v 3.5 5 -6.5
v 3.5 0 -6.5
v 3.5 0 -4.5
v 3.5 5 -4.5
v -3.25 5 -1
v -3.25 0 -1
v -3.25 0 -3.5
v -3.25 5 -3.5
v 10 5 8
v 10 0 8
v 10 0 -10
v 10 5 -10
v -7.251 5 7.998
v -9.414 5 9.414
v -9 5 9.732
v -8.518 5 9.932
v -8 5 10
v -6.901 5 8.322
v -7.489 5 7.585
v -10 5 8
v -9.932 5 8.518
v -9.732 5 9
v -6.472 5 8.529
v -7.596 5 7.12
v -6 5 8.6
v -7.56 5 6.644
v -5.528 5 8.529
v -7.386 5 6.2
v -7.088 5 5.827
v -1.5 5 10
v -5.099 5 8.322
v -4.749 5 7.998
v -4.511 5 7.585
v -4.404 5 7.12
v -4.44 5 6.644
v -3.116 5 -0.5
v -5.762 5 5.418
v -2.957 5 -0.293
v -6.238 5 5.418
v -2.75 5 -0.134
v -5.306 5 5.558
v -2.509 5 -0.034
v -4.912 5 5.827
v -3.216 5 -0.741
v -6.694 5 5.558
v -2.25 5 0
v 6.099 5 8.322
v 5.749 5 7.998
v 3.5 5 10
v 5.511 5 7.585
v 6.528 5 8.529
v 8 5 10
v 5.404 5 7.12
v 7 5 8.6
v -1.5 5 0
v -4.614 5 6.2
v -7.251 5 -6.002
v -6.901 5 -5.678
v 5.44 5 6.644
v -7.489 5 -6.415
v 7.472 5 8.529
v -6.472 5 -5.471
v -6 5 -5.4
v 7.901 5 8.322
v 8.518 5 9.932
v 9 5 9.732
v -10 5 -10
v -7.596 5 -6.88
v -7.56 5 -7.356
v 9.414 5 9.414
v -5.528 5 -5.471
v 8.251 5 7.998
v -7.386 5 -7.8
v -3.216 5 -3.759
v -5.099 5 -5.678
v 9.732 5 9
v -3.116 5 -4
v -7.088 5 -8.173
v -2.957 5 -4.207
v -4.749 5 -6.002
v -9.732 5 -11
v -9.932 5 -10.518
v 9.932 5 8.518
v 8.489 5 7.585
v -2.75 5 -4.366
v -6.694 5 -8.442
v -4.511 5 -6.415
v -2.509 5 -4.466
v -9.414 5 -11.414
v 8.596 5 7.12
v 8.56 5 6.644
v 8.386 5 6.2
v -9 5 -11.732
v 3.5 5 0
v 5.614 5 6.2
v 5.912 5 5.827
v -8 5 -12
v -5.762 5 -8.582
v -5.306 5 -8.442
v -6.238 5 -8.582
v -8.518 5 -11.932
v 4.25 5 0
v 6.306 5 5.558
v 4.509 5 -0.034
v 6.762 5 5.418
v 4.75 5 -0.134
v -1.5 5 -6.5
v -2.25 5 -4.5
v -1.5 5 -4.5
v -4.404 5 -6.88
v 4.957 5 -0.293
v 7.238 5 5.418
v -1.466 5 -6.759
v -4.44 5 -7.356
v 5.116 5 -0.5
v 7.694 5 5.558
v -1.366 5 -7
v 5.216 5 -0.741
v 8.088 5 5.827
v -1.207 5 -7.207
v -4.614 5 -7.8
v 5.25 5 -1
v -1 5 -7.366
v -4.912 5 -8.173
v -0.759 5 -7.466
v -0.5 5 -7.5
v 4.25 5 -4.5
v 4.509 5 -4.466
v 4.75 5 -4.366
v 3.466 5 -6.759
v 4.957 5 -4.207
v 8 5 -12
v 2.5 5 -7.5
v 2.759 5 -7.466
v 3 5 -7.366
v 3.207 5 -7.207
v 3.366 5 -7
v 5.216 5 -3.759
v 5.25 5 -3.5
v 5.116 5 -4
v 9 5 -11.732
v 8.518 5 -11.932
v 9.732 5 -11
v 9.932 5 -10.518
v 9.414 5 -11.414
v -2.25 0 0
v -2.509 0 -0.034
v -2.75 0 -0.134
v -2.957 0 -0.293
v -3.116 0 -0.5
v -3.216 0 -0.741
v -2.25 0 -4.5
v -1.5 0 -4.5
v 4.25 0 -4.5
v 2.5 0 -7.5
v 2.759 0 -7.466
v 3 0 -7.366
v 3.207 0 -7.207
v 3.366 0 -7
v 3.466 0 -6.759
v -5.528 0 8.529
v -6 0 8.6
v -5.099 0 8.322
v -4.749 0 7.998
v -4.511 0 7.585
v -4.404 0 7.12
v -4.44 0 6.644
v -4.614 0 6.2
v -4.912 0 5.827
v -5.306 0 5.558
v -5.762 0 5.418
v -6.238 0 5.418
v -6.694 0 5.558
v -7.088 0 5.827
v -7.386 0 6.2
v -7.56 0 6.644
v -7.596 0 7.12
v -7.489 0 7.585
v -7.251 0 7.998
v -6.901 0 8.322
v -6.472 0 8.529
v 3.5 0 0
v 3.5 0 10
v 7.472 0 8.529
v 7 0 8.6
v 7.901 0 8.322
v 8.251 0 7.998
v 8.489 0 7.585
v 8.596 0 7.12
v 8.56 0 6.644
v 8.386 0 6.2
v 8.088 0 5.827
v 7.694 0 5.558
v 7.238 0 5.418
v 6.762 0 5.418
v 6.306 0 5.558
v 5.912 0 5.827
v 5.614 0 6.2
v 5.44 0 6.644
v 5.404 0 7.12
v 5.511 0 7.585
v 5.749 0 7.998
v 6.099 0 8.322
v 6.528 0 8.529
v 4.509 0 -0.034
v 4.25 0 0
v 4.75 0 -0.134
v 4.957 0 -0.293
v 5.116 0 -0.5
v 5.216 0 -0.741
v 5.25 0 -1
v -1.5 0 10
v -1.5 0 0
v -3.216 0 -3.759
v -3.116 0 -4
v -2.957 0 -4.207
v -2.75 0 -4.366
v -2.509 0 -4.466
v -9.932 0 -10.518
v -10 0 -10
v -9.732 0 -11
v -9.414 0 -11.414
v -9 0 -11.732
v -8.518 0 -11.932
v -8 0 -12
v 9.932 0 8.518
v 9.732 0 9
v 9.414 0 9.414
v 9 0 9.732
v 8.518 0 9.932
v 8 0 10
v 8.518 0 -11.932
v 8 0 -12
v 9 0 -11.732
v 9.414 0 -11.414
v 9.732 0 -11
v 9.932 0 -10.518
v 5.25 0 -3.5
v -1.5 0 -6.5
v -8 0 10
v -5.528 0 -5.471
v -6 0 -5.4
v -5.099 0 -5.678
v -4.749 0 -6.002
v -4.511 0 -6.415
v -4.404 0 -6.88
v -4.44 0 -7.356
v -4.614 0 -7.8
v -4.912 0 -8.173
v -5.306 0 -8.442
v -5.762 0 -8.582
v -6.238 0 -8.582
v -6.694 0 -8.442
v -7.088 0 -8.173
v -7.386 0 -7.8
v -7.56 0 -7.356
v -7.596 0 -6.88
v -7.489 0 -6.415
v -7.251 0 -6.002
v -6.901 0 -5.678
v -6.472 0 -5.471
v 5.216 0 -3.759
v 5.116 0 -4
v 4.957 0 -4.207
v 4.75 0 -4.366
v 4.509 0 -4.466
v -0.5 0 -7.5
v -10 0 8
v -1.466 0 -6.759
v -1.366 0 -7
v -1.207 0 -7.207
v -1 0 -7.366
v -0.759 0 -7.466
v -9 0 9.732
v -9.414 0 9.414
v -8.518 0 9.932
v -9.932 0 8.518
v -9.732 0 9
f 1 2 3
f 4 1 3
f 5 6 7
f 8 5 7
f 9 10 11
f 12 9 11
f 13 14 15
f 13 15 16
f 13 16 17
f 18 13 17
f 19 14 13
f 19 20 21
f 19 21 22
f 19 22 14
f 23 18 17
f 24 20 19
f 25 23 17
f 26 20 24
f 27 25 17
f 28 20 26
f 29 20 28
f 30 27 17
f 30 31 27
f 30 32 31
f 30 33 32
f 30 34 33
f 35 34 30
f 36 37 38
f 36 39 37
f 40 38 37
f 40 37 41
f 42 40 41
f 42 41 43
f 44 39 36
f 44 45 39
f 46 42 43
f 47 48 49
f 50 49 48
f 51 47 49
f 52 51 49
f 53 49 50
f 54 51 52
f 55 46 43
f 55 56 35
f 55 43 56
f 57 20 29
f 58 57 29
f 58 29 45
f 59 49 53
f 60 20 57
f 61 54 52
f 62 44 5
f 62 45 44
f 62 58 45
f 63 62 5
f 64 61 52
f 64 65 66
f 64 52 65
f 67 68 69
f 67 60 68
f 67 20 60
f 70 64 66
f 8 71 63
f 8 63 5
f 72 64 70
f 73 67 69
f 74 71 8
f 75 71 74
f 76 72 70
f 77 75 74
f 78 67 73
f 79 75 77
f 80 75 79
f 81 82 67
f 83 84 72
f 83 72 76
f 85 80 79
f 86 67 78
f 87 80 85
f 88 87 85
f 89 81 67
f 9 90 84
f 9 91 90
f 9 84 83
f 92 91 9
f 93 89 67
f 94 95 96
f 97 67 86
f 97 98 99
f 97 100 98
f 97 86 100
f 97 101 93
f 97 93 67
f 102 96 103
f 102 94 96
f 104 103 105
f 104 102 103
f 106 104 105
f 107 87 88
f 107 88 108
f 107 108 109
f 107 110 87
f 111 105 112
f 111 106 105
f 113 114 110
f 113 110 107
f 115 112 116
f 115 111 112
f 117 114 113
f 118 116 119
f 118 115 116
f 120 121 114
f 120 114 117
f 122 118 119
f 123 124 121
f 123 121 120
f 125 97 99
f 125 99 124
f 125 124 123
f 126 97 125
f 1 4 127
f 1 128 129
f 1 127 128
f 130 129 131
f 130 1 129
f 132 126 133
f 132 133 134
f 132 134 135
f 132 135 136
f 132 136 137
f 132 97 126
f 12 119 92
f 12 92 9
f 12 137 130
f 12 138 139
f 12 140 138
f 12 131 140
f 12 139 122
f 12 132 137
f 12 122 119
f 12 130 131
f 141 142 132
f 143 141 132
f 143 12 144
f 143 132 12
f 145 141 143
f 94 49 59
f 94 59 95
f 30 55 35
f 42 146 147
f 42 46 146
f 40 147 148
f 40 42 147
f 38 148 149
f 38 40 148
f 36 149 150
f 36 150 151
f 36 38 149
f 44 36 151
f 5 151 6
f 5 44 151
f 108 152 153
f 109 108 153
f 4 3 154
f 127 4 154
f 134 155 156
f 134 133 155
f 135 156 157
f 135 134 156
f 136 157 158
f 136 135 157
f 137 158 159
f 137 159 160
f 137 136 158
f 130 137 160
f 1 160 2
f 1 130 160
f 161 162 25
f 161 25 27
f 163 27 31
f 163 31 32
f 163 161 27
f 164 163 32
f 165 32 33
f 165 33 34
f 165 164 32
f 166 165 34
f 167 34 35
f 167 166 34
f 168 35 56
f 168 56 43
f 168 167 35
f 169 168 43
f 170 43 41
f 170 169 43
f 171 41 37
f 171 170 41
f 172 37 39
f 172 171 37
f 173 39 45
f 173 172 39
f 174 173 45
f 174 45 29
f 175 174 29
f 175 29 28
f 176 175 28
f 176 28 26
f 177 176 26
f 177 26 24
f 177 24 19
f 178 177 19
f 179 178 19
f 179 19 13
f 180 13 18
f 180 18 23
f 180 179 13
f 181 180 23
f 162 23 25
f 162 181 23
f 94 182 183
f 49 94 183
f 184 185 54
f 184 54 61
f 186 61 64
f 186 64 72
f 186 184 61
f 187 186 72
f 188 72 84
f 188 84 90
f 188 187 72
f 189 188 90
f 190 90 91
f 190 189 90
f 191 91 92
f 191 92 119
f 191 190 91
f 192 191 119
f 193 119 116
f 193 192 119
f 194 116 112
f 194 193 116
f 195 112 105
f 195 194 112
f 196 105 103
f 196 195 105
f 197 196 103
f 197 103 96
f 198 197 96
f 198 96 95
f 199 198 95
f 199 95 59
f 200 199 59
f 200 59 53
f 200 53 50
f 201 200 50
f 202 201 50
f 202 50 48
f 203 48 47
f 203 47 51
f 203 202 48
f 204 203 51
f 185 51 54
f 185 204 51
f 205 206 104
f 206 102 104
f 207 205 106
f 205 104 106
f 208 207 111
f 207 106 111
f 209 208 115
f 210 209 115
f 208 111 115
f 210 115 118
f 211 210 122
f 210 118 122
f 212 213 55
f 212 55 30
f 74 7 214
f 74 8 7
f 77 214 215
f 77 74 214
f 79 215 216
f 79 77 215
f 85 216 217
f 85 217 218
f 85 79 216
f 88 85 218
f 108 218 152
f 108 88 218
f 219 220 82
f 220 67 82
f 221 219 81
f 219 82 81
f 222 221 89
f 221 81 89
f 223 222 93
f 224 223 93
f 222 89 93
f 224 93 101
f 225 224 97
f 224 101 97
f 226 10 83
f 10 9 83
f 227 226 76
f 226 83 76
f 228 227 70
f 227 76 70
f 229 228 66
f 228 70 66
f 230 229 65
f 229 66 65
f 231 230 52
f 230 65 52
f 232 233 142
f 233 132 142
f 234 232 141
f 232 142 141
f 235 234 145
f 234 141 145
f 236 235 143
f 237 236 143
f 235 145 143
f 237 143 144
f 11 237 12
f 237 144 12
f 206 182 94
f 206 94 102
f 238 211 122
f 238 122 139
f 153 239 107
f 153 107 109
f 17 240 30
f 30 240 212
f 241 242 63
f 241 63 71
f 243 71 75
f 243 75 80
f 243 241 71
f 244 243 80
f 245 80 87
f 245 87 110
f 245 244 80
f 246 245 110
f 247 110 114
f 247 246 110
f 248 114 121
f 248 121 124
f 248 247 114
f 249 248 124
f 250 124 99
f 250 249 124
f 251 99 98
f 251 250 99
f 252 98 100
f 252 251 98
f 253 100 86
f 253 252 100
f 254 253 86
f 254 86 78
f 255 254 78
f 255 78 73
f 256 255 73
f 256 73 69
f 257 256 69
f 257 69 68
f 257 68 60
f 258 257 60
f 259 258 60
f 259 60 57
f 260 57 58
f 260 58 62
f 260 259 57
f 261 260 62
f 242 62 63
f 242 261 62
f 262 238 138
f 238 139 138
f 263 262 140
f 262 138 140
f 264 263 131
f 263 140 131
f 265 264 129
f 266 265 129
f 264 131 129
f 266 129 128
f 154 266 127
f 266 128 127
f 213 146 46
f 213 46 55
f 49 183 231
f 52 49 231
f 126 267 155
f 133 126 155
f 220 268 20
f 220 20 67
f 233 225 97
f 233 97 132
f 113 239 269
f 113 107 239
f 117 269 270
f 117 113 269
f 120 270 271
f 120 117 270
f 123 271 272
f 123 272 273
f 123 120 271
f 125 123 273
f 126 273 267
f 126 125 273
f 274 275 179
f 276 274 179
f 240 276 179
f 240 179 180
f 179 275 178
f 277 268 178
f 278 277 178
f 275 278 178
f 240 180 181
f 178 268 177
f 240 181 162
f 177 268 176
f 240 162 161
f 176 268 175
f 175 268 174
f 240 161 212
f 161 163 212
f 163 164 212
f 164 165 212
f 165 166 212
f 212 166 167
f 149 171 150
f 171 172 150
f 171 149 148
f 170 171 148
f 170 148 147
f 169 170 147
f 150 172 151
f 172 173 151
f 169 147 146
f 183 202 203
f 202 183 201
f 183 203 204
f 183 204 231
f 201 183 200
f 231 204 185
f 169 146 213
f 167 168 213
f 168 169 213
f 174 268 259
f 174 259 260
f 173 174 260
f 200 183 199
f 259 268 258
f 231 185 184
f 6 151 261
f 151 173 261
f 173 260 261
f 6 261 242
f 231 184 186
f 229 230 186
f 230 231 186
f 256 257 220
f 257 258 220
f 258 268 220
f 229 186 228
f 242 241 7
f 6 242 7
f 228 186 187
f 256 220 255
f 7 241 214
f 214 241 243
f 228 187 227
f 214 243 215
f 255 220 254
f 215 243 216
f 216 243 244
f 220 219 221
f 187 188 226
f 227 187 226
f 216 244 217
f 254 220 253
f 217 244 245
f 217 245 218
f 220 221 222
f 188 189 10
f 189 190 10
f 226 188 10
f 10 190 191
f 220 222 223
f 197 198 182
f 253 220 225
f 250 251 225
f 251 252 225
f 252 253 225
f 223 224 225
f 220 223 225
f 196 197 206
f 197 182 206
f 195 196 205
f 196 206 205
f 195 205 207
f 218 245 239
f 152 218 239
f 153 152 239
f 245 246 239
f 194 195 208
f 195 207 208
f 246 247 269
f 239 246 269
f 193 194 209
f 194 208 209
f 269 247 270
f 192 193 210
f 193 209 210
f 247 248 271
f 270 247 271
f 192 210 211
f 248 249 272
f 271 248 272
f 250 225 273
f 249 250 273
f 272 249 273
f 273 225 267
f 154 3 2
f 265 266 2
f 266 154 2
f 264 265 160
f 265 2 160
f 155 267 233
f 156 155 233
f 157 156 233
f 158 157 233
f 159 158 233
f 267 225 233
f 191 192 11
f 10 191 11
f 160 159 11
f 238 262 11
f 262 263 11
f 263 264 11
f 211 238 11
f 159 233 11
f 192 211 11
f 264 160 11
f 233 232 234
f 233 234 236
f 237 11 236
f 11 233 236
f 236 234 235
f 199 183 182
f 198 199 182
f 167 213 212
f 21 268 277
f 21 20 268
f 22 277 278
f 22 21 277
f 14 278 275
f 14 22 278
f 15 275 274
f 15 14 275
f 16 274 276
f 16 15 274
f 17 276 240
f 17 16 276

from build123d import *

# Parameters (mm, degrees)
SKETCH_2_W          = 20
SKETCH_2_H          = 22
SKETCH_2_R          = 1.6
SKETCH_2_W_2        = 8.5
SKETCH_2_H_2        = 4.5
EXTRUDE_1_DEPTH     = 5
SKETCH_3_W          = 5
SKETCH_3_H          = 17.5
CUT_EXTRUDE_1_DEPTH = 17.401219467
FILLET_1_R          = 2
FILLET_2_R          = 1


with BuildPart() as part:
    # 草图2 → 凸台-拉伸1 (new body)
    with BuildSketch(Plane(origin=(0, 0, 0), x_dir=(1, 0, 0), z_dir=(0, 1, 0))):
        with Locations((0, 1)):
            Rectangle(SKETCH_2_W, SKETCH_2_H)
        with Locations(Location((-6, -7, 0), (0, 0, 270))):
            Circle(SKETCH_2_R, mode=Mode.SUBTRACT)
        with Locations(Location((7, -7, 0), (0, 0, 270))):
            Circle(SKETCH_2_R, mode=Mode.SUBTRACT)
        with Locations(Location((-6, 7, 0), (0, 0, 270))):
            Circle(SKETCH_2_R, mode=Mode.SUBTRACT)
        with Locations((1, 2.25)):
            Rectangle(SKETCH_2_W_2, SKETCH_2_H_2, mode=Mode.SUBTRACT)
    extrude(amount=EXTRUDE_1_DEPTH)

    # 草图3 → 切除-拉伸1 (cut, through all)
    with BuildSketch(Plane.XZ):
        with Locations((1, 1.25)):
            Rectangle(SKETCH_3_W, SKETCH_3_H)
    extrude(amount=-CUT_EXTRUDE_1_DEPTH, mode=Mode.SUBTRACT)

    # 圆角1
    fillet_1_edges = [part.edges().sort_by_distance(p)[0] for p in [
        (10, 2.5, 10),
        (-10, 2.5, 10),
        (-10, 2.5, -12),
        (10, 2.5, -12),
    ]]
    fillet(fillet_1_edges, radius=FILLET_1_R)

    # 圆角2
    fillet_2_edges = [part.edges().sort_by_distance(p)[0] for p in [
        (5.25, 2.5, -4.5),
        (-3.25, 2.5, -4.5),
        (-3.25, 2.5, 0),
        (5.25, 2.5, 0),
        (-1.5, 2.5, -7.5),
        (3.5, 2.5, -7.5),
    ]]
    fillet(fillet_2_edges, radius=FILLET_2_R)


solid = part.part
